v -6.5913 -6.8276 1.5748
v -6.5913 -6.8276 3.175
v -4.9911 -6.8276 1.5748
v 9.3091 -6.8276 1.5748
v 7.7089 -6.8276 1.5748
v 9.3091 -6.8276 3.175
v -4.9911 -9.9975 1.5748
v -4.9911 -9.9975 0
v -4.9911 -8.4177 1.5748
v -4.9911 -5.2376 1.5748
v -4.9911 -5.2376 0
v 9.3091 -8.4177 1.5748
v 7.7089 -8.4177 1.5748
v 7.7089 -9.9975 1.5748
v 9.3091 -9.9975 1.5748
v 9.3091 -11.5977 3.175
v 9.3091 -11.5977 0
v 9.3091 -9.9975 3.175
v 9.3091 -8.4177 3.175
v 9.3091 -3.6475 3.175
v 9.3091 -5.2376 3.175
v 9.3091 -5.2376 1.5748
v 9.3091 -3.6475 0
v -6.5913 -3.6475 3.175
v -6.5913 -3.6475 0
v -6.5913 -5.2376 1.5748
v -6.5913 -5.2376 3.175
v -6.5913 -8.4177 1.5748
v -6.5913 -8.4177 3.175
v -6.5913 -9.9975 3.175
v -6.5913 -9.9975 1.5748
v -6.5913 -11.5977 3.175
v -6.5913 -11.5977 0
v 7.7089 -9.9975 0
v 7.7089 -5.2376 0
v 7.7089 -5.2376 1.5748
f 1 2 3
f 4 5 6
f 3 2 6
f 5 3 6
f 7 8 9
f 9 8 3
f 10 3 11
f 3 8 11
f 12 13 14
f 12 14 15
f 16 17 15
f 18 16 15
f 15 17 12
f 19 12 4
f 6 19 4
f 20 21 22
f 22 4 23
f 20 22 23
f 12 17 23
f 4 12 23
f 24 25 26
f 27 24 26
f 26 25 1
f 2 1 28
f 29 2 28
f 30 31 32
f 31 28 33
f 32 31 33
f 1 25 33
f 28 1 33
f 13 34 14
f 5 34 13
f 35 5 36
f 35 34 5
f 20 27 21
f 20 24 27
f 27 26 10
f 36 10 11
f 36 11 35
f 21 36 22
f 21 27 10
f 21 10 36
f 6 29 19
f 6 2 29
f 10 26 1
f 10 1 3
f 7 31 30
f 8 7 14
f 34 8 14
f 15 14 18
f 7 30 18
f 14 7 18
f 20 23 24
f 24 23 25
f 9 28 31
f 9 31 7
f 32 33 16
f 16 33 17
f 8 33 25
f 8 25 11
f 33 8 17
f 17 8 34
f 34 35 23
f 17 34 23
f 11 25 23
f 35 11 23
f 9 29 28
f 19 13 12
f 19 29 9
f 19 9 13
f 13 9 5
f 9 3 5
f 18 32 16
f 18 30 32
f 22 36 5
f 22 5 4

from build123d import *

# Parameters (mm, degrees)
F0_W     = 1.6002
F0_H     = 1.57988
F0_H_2   = 1.59004
F0_W_2   = 12.7
F0_H_3   = 1.6002
F1_DEPTH = 3.175
F2_T     = -1.6002
F3_DEPTH = 25.4
F4_W     = 1.6002
F4_H     = 1.59004
F4_H_2   = 1.57988
F5_DEPTH = 1.6002


with BuildPart() as f1:
    # F0 (on Top) → F1 (new body)
    with BuildSketch(Plane.XY):
        with Locations((8.509001, -9.207606)):
            Rectangle(F0_W, F0_H)
        with Locations((-5.791199, -4.442566)):
            Rectangle(F0_W, F0_H_2)
        with Locations((8.509001, -4.442566)):
            Rectangle(F0_W, F0_H_2)
        with Locations((1.358901, -4.442566)):
            Rectangle(F0_W_2, F0_H_2)
        with Locations((1.358901, -7.622646)):
            Rectangle(F0_W_2, F0_H_2)
        with Locations((-5.791199, -10.797646)):
            Rectangle(F0_W, F0_H_3)
        with Locations((-5.791199, -6.032606)):
            Rectangle(F0_W, F0_H_2)
        with Locations((-5.791199, -7.622646)):
            Rectangle(F0_W, F0_H_2)
        with Locations((-5.791199, -9.207606)):
            Rectangle(F0_W, F0_H)
        with Locations((8.509001, -6.032606)):
            Rectangle(F0_W, F0_H_2)
        with Locations((8.509001, -7.622646)):
            Rectangle(F0_W, F0_H_2)
        with Locations((8.509001, -10.797646)):
            Rectangle(F0_W, F0_H_3)
        with Locations((1.358901, -6.032606)):
            Rectangle(F0_W_2, F0_H_2)
        with Locations((1.358901, -9.207606)):
            Rectangle(F0_W_2, F0_H)
        with Locations((1.358901, -10.797646)):
            Rectangle(F0_W_2, F0_H_3)
    extrude(amount=F1_DEPTH)

    # F2
    f2_openings = [f1.faces().sort_by_distance(p)[0] for p in [
        (1.358901, -7.622646, 0),
    ]]
    offset(amount=F2_T, openings=f2_openings)

    # F0 (on Top) → F3 (cut)
    with BuildSketch(Plane.XY):
        with Locations((1.358901, -6.032606)):
            Rectangle(F0_W_2, F0_H_2)
        with Locations((1.358901, -9.207606)):
            Rectangle(F0_W_2, F0_H)
    extrude(amount=F3_DEPTH, mode=Mode.SUBTRACT)

    # F4 (on face) → F5 (cut)
    with BuildSketch(Plane.XY.offset(3.175)):
        with Locations((-5.791199, -6.032606)):
            Rectangle(F4_W, F4_H)
        with Locations((-5.791199, -9.207606)):
            Rectangle(F4_W, F4_H_2)
        with Locations((8.509001, -6.032606)):
            Rectangle(F4_W, F4_H)
        with Locations((8.509001, -9.207606)):
            Rectangle(F4_W, F4_H_2)
    extrude(amount=-F5_DEPTH, mode=Mode.SUBTRACT)


solid = f1.part
